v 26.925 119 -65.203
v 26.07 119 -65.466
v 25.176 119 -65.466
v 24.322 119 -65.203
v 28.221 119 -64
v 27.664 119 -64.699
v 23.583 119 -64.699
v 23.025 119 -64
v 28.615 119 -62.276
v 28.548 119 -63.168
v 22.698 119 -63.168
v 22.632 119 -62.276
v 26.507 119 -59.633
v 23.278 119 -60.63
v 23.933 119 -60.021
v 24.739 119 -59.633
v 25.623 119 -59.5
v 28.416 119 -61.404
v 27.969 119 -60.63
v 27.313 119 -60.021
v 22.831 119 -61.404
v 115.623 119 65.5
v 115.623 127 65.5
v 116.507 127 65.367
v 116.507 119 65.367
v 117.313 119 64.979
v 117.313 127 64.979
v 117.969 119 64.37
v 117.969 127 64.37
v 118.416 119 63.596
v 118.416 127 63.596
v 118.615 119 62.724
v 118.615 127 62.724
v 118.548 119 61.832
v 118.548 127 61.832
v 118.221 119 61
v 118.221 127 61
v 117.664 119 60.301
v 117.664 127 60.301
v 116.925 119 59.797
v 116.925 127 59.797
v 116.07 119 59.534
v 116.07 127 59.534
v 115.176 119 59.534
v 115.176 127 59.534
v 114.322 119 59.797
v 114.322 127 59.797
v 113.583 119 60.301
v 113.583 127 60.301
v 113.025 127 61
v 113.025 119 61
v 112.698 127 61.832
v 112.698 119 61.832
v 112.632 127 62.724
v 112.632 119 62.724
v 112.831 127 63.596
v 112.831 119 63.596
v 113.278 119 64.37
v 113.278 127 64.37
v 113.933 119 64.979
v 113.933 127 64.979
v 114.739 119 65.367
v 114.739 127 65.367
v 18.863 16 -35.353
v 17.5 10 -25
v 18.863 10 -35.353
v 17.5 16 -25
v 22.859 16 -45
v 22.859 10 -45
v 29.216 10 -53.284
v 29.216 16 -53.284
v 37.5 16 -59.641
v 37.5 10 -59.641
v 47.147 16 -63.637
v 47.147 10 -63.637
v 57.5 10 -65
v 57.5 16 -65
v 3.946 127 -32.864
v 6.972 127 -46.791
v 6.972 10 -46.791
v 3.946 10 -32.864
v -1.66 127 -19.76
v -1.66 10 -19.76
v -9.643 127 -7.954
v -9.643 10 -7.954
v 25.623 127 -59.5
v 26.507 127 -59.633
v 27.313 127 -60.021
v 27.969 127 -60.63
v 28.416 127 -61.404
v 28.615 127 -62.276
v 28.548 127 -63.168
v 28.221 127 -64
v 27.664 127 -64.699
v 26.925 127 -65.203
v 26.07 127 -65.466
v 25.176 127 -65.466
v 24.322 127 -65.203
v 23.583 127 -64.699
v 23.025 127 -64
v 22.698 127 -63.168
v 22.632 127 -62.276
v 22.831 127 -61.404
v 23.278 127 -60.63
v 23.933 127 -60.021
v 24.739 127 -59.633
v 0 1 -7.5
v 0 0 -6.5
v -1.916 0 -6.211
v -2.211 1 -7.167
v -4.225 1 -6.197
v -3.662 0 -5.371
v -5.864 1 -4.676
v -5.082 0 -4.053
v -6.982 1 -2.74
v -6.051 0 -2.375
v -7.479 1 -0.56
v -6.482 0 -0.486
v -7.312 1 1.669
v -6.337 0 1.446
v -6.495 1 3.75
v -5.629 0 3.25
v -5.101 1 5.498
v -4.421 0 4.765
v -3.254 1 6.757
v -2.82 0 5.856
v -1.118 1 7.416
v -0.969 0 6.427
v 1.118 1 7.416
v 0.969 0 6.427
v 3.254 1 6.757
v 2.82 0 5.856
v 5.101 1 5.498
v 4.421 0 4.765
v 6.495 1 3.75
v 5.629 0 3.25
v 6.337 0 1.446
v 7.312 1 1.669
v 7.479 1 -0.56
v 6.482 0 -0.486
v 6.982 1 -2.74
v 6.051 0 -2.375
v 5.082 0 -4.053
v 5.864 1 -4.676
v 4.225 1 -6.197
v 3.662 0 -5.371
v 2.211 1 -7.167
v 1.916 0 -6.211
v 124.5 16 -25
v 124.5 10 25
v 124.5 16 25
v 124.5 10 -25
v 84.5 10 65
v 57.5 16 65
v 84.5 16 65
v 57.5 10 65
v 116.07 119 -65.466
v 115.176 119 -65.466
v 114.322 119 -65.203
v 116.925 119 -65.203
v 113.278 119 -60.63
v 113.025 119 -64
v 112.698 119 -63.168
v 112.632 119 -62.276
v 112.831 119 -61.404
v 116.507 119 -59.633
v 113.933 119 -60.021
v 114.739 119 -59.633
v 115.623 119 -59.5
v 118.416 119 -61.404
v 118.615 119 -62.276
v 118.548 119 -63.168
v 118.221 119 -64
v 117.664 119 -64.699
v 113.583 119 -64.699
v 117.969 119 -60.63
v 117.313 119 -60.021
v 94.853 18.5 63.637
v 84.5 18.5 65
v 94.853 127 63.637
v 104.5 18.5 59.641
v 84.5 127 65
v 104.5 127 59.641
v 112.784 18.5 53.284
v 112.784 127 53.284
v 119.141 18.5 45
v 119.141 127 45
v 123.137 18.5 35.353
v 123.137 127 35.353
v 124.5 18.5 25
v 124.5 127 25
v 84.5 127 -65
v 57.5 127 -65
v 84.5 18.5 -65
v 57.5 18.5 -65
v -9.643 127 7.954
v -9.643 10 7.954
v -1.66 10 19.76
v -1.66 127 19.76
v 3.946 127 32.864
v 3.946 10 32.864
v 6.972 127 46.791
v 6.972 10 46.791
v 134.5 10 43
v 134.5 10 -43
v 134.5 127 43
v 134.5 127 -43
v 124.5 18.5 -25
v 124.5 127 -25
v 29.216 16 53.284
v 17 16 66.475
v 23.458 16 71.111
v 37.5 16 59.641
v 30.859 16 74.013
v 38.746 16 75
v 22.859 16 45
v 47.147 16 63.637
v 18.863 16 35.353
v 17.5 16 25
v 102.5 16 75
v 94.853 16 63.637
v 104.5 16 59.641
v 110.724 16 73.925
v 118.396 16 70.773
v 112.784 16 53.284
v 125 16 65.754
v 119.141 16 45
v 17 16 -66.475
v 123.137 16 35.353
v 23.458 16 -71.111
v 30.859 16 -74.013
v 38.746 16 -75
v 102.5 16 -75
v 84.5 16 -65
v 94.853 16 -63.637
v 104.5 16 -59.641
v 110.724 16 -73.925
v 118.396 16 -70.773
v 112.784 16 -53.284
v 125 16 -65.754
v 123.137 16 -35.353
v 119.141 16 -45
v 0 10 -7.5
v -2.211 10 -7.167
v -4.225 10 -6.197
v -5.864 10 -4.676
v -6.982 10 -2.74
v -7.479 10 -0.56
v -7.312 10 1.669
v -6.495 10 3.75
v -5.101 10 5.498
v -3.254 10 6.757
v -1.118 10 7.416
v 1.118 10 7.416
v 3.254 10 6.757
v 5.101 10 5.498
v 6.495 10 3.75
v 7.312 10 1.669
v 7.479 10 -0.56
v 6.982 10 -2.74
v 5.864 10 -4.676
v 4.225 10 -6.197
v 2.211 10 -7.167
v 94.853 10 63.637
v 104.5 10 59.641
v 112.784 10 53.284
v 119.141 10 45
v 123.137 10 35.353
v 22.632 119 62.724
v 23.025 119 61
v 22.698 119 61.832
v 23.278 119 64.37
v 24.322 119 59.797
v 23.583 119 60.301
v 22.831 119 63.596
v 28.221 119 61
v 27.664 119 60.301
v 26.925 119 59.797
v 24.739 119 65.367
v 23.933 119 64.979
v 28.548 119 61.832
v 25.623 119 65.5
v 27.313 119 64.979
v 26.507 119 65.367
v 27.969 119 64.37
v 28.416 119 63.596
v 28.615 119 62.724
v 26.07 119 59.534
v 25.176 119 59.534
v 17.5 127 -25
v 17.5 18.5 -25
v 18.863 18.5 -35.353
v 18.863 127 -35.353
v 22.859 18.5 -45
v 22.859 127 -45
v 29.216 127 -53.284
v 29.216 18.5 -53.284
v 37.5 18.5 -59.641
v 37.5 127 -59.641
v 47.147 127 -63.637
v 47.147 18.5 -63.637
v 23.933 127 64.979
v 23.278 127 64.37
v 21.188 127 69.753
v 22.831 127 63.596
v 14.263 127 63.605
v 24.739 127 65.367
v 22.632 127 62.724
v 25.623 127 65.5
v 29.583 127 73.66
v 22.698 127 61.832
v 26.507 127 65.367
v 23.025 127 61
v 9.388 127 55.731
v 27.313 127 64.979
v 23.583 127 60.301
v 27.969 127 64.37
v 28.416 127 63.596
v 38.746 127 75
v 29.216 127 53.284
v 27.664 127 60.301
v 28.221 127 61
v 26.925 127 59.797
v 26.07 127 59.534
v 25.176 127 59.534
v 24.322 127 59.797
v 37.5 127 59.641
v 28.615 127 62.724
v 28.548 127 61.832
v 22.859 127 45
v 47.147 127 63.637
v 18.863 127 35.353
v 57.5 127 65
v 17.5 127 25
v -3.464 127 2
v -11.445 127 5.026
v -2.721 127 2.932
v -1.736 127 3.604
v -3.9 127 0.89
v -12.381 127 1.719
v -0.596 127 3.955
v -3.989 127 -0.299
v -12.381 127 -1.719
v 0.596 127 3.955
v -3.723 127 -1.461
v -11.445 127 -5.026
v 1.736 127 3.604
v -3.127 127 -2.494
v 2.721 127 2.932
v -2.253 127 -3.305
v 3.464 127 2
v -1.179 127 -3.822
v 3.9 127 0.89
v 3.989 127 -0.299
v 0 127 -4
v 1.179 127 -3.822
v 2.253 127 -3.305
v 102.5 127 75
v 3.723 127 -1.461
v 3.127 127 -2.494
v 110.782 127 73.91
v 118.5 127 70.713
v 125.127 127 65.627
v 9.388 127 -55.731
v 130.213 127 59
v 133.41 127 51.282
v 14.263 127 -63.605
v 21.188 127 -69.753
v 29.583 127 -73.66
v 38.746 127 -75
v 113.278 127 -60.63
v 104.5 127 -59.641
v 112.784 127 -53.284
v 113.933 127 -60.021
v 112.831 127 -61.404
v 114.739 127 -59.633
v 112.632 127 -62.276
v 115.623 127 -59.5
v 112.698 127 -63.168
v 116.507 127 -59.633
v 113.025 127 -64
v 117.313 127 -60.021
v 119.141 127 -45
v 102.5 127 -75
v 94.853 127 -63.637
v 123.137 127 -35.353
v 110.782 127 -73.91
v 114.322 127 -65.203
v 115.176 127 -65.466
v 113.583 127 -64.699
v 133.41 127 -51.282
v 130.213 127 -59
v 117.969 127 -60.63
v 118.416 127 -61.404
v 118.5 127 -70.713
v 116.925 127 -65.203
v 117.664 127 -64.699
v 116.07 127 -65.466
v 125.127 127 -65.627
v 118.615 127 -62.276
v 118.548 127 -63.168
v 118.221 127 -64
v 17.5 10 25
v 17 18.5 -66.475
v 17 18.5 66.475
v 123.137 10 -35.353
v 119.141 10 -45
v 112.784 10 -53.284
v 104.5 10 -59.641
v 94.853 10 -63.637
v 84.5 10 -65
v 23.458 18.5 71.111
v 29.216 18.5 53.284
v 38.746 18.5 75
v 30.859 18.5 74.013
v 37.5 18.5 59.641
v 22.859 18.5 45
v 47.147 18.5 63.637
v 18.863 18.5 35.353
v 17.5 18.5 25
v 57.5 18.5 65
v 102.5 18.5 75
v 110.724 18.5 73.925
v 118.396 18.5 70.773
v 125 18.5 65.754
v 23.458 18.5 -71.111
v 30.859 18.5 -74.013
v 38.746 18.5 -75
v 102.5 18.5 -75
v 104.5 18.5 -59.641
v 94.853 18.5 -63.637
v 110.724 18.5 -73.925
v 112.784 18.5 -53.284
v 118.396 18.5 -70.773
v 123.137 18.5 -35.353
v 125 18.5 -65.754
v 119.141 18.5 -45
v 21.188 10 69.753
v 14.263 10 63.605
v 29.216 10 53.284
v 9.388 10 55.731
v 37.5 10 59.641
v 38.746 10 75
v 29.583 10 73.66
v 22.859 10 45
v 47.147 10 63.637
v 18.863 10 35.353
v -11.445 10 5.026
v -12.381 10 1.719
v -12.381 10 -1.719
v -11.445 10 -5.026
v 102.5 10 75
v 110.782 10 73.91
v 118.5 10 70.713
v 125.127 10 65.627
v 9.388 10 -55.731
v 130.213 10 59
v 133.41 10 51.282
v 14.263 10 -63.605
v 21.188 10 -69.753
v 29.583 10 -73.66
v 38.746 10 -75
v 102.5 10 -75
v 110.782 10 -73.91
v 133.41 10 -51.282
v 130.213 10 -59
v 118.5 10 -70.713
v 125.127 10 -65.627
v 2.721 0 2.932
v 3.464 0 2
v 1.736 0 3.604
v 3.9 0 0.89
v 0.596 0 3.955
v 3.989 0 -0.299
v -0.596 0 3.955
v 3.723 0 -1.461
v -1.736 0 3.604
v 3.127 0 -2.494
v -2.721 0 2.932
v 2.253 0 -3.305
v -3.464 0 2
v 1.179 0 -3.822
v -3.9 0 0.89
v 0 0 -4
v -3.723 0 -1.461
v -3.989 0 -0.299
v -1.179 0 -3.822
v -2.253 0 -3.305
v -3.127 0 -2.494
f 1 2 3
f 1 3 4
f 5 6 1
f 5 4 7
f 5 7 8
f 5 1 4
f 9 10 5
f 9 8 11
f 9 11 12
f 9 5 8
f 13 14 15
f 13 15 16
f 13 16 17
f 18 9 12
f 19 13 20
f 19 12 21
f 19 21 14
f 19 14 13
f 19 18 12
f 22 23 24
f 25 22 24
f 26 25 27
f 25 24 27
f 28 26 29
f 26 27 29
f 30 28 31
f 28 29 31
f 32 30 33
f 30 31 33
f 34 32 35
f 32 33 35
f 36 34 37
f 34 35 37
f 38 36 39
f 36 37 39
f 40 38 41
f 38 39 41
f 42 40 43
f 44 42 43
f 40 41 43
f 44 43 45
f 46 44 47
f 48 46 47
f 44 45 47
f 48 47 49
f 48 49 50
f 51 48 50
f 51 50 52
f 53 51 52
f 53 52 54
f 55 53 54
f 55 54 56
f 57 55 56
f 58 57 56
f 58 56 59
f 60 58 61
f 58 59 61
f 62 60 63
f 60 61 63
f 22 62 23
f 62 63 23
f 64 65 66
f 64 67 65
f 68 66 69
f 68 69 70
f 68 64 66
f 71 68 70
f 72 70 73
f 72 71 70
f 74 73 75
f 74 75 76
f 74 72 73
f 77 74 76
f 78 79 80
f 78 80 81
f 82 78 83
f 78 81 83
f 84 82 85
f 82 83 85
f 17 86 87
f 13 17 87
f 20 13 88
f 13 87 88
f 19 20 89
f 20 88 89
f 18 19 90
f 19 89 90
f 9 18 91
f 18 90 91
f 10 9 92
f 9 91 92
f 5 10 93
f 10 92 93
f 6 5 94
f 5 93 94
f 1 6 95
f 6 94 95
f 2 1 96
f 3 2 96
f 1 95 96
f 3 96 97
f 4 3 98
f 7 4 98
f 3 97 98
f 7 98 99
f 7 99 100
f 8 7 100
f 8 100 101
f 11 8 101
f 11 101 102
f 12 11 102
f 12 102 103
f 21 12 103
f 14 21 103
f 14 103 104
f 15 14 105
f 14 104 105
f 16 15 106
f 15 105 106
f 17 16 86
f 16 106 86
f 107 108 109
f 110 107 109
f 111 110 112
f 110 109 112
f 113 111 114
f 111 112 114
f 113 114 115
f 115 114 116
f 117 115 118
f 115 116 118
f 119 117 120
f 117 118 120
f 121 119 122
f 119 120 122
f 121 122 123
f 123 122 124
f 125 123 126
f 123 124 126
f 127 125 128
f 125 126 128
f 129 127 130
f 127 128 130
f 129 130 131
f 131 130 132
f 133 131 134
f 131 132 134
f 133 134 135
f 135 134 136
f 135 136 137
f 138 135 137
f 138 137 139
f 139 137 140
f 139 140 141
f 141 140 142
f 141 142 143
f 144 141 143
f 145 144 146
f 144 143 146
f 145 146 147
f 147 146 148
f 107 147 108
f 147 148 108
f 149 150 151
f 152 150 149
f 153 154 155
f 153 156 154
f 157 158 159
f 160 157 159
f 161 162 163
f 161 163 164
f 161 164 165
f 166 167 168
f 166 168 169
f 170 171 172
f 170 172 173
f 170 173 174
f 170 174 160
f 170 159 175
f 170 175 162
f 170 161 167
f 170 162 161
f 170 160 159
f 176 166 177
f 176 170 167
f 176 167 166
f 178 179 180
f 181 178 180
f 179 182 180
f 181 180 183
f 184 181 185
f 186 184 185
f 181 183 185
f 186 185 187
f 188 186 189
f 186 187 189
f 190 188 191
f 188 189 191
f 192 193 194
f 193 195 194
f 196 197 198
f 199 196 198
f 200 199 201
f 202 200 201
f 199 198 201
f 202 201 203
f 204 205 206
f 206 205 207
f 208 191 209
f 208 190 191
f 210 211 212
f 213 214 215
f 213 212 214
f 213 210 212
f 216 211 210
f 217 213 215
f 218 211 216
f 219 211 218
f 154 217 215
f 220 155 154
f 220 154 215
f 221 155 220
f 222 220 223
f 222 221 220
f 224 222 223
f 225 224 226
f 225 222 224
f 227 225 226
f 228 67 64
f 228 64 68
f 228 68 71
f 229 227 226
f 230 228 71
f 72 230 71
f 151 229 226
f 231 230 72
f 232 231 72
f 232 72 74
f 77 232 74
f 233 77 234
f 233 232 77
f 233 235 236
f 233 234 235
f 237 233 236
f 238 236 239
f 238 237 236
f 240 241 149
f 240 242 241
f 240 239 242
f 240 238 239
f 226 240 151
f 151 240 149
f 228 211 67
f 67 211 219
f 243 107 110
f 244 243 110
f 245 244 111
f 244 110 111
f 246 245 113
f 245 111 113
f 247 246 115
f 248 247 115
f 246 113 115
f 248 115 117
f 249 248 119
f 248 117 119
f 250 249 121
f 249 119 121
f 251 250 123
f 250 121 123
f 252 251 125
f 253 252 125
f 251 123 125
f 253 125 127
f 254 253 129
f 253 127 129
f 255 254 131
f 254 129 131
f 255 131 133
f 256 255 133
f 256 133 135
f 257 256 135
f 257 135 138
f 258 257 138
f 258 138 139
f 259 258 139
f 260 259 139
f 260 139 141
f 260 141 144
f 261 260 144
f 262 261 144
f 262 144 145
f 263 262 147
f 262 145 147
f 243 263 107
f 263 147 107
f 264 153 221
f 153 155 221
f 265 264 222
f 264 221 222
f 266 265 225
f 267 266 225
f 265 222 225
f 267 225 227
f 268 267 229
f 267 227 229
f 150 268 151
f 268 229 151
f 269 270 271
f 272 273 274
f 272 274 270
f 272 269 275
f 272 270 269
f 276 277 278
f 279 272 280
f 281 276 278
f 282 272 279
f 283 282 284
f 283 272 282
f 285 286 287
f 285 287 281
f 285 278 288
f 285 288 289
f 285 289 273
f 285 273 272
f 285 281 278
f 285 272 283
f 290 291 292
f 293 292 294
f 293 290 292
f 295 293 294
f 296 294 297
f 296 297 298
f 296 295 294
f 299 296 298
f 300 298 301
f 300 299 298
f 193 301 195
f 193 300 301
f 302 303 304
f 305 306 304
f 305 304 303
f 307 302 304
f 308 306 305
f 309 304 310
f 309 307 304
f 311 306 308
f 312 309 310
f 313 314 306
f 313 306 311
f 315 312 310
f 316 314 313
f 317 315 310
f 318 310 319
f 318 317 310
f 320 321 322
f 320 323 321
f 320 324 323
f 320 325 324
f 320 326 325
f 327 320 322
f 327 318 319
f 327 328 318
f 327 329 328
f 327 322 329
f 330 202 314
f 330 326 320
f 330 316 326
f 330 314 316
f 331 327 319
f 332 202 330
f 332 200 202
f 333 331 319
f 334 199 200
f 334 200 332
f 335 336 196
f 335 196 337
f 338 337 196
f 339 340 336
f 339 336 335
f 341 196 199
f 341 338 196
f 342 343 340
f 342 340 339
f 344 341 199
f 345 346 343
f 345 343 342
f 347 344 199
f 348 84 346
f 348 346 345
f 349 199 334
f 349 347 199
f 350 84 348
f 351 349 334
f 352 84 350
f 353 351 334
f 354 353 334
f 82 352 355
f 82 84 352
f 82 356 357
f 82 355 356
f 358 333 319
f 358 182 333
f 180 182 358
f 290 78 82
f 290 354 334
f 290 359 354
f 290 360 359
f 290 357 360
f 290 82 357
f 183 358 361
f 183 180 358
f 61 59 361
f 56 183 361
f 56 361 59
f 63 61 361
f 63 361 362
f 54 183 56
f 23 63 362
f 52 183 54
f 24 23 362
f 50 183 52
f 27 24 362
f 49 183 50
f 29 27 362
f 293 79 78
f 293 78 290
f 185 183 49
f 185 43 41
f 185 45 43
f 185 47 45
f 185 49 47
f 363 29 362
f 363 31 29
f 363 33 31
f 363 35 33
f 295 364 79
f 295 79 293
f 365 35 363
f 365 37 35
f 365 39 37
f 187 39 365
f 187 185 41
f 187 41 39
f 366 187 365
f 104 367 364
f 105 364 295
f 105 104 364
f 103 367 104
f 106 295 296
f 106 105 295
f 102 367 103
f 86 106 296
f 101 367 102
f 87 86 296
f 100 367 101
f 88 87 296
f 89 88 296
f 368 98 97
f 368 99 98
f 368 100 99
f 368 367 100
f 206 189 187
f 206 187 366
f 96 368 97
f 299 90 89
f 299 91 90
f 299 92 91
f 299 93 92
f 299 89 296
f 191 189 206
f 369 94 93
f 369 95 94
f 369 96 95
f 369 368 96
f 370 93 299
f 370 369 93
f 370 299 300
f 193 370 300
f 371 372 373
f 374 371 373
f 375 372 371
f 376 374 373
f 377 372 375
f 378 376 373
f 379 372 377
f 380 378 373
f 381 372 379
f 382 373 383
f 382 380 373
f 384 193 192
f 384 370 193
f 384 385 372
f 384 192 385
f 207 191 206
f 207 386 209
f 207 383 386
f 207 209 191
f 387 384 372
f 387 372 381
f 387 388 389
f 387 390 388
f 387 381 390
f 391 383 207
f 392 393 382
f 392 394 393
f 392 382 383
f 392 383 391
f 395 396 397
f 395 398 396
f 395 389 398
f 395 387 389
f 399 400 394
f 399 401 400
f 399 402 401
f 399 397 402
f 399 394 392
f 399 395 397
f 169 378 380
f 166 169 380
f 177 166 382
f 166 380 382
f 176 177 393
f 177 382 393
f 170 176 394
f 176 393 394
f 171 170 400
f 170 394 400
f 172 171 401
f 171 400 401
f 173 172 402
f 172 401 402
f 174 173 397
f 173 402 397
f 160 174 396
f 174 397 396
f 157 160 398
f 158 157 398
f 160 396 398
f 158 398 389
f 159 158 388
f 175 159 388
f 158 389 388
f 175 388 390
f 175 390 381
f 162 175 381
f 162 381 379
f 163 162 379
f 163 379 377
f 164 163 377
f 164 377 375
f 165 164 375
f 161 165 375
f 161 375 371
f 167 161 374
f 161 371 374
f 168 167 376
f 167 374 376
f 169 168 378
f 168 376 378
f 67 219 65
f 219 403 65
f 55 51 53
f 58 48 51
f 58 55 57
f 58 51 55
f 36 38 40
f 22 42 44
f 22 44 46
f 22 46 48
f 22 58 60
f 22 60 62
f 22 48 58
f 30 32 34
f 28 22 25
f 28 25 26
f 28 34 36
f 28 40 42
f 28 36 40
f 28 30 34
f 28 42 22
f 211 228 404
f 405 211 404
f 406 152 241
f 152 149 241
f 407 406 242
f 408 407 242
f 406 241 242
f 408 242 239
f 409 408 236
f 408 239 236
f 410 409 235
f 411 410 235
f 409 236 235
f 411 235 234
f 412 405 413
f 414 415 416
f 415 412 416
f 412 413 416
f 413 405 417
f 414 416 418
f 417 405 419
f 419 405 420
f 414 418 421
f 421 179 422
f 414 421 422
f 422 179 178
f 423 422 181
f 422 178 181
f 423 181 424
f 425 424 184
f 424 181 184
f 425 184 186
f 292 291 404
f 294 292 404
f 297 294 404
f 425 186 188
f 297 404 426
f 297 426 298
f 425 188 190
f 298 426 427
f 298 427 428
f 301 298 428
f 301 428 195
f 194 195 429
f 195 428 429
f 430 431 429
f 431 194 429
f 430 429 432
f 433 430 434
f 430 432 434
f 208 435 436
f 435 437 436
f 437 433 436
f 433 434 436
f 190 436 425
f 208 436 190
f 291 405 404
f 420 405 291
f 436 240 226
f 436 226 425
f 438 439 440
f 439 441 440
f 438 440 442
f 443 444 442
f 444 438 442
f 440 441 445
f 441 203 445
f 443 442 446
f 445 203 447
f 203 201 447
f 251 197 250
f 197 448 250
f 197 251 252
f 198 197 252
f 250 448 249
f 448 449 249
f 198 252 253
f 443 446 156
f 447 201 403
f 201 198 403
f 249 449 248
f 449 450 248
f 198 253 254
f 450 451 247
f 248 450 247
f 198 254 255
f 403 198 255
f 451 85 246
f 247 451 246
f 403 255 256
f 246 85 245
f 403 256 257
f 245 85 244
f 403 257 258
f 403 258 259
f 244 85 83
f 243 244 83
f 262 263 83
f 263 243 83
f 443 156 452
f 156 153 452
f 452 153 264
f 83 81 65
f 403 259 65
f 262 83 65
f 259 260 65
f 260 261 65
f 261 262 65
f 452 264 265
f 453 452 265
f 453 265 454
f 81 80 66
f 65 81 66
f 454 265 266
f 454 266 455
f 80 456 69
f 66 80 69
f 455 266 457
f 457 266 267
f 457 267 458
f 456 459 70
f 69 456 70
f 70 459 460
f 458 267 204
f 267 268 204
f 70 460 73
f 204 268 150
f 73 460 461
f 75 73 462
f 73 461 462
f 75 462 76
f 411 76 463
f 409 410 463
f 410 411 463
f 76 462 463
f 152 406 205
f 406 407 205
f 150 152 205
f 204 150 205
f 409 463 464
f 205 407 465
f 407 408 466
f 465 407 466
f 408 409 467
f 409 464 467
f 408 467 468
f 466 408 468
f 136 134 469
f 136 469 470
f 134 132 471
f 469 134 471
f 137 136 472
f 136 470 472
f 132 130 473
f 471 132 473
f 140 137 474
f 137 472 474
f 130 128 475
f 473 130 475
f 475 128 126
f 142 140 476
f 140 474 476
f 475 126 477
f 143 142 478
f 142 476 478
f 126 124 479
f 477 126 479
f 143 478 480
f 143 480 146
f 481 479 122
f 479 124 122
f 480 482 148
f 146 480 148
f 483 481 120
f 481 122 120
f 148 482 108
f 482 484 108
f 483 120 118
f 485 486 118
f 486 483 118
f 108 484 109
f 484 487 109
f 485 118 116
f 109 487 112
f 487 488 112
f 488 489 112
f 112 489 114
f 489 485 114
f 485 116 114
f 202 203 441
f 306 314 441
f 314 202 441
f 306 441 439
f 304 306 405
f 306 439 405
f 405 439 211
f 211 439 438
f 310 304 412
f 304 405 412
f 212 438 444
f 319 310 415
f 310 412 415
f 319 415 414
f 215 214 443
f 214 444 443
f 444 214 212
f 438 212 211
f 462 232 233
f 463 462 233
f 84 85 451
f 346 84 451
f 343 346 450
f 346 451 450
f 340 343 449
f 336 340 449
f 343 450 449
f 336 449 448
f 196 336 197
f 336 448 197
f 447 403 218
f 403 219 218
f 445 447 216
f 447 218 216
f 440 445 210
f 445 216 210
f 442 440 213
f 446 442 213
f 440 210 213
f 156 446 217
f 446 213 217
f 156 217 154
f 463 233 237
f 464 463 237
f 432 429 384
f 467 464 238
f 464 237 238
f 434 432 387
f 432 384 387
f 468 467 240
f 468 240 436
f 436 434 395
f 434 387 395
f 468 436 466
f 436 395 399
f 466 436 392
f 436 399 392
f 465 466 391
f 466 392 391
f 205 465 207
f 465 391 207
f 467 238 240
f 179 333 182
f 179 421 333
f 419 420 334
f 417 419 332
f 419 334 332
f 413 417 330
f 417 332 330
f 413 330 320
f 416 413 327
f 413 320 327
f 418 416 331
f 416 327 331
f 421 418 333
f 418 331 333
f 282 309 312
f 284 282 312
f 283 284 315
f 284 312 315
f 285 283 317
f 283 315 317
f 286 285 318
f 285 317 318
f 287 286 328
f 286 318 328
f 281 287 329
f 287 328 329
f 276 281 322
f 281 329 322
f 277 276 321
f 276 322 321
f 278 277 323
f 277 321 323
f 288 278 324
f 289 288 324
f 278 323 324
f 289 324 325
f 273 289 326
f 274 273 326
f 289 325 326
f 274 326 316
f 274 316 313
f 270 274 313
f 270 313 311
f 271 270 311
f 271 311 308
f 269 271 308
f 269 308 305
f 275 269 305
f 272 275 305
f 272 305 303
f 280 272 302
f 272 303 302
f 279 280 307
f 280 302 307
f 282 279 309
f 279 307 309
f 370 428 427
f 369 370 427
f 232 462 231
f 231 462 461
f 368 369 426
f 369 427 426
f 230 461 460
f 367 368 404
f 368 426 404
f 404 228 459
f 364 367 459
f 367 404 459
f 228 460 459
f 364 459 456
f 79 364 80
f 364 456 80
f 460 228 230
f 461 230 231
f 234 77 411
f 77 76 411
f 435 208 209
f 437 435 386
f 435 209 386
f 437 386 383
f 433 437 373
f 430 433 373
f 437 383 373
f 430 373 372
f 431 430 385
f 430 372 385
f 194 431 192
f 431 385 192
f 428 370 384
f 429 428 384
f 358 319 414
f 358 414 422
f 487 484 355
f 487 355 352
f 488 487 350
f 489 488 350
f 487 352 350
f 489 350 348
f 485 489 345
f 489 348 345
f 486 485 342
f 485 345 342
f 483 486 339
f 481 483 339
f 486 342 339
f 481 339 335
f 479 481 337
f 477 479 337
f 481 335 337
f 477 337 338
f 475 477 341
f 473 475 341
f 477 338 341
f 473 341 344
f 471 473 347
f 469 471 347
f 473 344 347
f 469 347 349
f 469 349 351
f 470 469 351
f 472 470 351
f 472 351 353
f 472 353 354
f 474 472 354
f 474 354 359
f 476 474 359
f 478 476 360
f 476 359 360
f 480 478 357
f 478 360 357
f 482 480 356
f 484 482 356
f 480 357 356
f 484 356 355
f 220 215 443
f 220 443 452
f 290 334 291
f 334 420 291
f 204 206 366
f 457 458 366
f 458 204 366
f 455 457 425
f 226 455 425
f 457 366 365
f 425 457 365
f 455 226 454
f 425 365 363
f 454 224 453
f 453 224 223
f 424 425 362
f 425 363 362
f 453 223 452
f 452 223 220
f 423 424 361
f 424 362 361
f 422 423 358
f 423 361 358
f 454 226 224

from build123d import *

# Parameters (mm, degrees)
CUT_EXTRUDE1_REACH       = 130.224
SKETCH3_W                = 13.598117377
SKETCH3_H                = 26.0138757
BOSS_EXTRUDE1_DEPTH      = 75
BOSS_EXTRUDE1_DEPTH_BACK = 75
SKETCH2_W                = 127
SKETCH2_H                = 117
BOSS_EXTRUDE3_START      = -117
BOSS_EXTRUDE3_DEPTH      = 117
CUT_EXTRUDE2_DEPTH       = 200.610245228
CUT_EXTRUDE2_DEPTH_BACK  = 200.610245228
SKETCH5_W                = 107
SKETCH5_H                = 130
CUT_EXTRUDE3_DEPTH       = 239.158035766
CUT_EXTRUDE3_DEPTH_BACK  = 239.158035766
SKETCH6_W                = 108
SKETCH6_H                = 2.5
FILLET3_R                = 40
FILLET2_R                = 32
CHAMFER1_SIZE            = 1
SKETCH7_R                = 3
CUT_EXTRUDE4_DEPTH       = 8


with BuildPart() as part:
    # Sketch1 → Revolve1 (revolve)
    with BuildSketch(Plane.XY, mode=Mode.PRIVATE) as revolve1_sk:
        Polygon((4, 0), (4, 127), (12.5, 127), (12.5, 10), (7.5, 10), (7.5, 0), align=None)
    revolve(revolve1_sk.sketch.rotate(Axis((0, 0, 0), (0, 1, 0)), 90), axis=Axis((0, 0, 0), (0, 1, 0)))

    # Sketch3 → Cut-Extrude1 (cut, up to next)
    with BuildSketch(Plane.XZ, mode=Mode.PRIVATE) as cut_extrude1_sk1:
        with Locations((14.299058689, 0)):
            Rectangle(SKETCH3_W, SKETCH3_H)
    cut_extrude1_tool1 = extrude(cut_extrude1_sk1.sketch, amount=-CUT_EXTRUDE1_REACH, mode=Mode.PRIVATE) & part.part
    add(cut_extrude1_tool1.solids().sort_by_distance((14.299059, 0, 0))[0], mode=Mode.SUBTRACT)



with BuildPart() as body_2:
    # Sketch2 → Boss-Extrude1 (new, two sides: drawn at the far end of the back side and taken through both)
    with BuildSketch(Plane.XY.offset(-BOSS_EXTRUDE1_DEPTH_BACK)):
        with Locations((71, 68.5)):
            Rectangle(SKETCH2_W, SKETCH2_H)
    extrude(amount=BOSS_EXTRUDE1_DEPTH + BOSS_EXTRUDE1_DEPTH_BACK)


with BuildPart() as part_1:
    add(part.part)

    add(body_2.part)  # Boss-Extrude3 merges body 2
    # Sketch4 → Boss-Extrude3 (add)
    with BuildSketch(Plane(origin=(0, 127, 0), x_dir=(1, 0, 0), z_dir=(0, 1, 0)).offset(BOSS_EXTRUDE3_START)):
        with BuildLine():
            Line((7.5, -55.677643628), (7.5, -10))
            ThreePointArc((7.5, -10), (-1.481398078, -12.411907981), (-9.642857143, -7.95394909))
            ThreePointArc((-9.642857143, -7.95394909), (3.084296109, -30.323015986), (7.5, -55.677643628))
        make_face()
        with BuildLine():
            Line((7.5, 10), (7.5, 55.677643628))
            ThreePointArc((7.5, 55.677643628), (3.084296109, 30.323015986), (-9.642857143, 7.95394909))
            ThreePointArc((-9.642857143, 7.95394909), (-1.481398078, 12.411907981), (7.5, 10))
        make_face()
    extrude(amount=BOSS_EXTRUDE3_DEPTH)

    # Sketch5 → Cut-Extrude2 (cut, two sides: drawn at the far end of the back side and taken through both)
    with BuildSketch(Plane(origin=(0, 127, 0), x_dir=(1, 0, 0), z_dir=(0, 1, 0)).offset(-CUT_EXTRUDE2_DEPTH_BACK)):
        with Locations((71, 0)):
            Rectangle(SKETCH5_W, SKETCH5_H)
    extrude(amount=CUT_EXTRUDE2_DEPTH + CUT_EXTRUDE2_DEPTH_BACK, mode=Mode.SUBTRACT)

    # Sketch6 → Cut-Extrude3 (cut, two sides: drawn at the far end of the back side and taken through both)
    with BuildSketch(Plane.XY.offset(75).offset(-CUT_EXTRUDE3_DEPTH_BACK)):
        with Locations((71, 17.25)):
            Rectangle(SKETCH6_W, SKETCH6_H)
    extrude(amount=CUT_EXTRUDE3_DEPTH + CUT_EXTRUDE3_DEPTH_BACK, mode=Mode.SUBTRACT)

    # Fillet3
    fillet3_edges = [part_1.edges().sort_by_distance(p)[0] for p in [
        (17.5, 13, -65),
        (124.5, 13, -65),
        (124.5, 13, 65),
        (17.5, 13, 65),
        (17.5, 72.75, -65),
        (17.5, 72.75, 65),
        (124.5, 72.75, 65),
        (124.5, 72.75, -65),
    ]]
    fillet(fillet3_edges, radius=FILLET3_R)

    # Fillet2
    # the kernel refuses this fillet: 32 mm, written as the material it takes off along each edge
    with BuildSketch(Plane(origin=(7.5, -68.115762804, -75), x_dir=(1, 0, 0), z_dir=(0, 1, 0))) as fillet2_piece_1:
        with BuildLine():
            CenterArc((31.246305122, -32), FILLET2_R, 90, 83.19545987)
            Line((-0.528290802, -28.208555177), (-3.705750395, -27.829410694))
            ThreePointArc((-3.705750395, -27.829410694), (-3.2, -19.322356372), (-3.2, 0))
            Line((-3.2, 0), (0, 3.2))
            Line((0, 3.2), (31.246305122, 3.2))
            Line((31.246305122, 3.2), (31.246305122, 0))
        make_face()
    extrude(amount=273.231525609, mode=Mode.SUBTRACT)
    with BuildSketch(Plane(origin=(134.5, 207, -75), x_dir=(0, 0, 1), z_dir=(0, -1, 0)), Plane(origin=(134.5, 207, 75), x_dir=(-1, 0, 0), z_dir=(0, -1, 0))) as fillet2_piece_2:
        with BuildLine():
            CenterArc((FILLET2_R, FILLET2_R), FILLET2_R, 180, 90)
            Line((0, FILLET2_R), (0, 0))
            Line((0, 0), (FILLET2_R, 0))
        make_face()
    extrude(amount=277, mode=Mode.SUBTRACT)
    with BuildSketch(Plane(origin=(7.5, -68.115762804, 75), x_dir=(1, 0, 0), z_dir=(0, 1, 0))) as fillet2_piece_3:
        with BuildLine():
            CenterArc((31.246305122, 32), FILLET2_R, 186.80454013, 83.19545987)
            Line((-0.528290802, 28.208555177), (-3.705750395, 27.829410694))
            ThreePointArc((-3.705750395, 27.829410694), (-3.2, 19.322356372), (-3.2, 0))
            Line((-3.2, 0), (0, -3.2))
            Line((0, -3.2), (31.246305122, -3.2))
            Line((31.246305122, -3.2), (31.246305122, 0))
        make_face()
    extrude(amount=273.231525609, mode=Mode.SUBTRACT)

    # Chamfer1
    chamfer1_edges = [part_1.edges().sort_by_distance(p)[0] for p in [
        (0, 0, 7.5),
    ]]
    chamfer(chamfer1_edges, length=CHAMFER1_SIZE)

    # Sketch7 → Cut-Extrude4 (cut)
    with BuildSketch(Plane(origin=(0, 127, 0), x_dir=(1, 0, 0), z_dir=(0, 1, 0))):
        with Locations(Location((115.623152561, -62.5, 0), (0, 0, 270))):
            Circle(SKETCH7_R)
        with Locations(Location((25.623152561, -62.5, 0), (0, 0, 270))):
            Circle(SKETCH7_R)
        with Locations(Location((25.623152561, 62.5, 0), (0, 0, 270))):
            Circle(SKETCH7_R)
        with Locations(Location((115.623152561, 62.5, 0), (0, 0, 270))):
            Circle(SKETCH7_R)
    extrude(amount=-CUT_EXTRUDE4_DEPTH, mode=Mode.SUBTRACT)


solid = part_1.part
